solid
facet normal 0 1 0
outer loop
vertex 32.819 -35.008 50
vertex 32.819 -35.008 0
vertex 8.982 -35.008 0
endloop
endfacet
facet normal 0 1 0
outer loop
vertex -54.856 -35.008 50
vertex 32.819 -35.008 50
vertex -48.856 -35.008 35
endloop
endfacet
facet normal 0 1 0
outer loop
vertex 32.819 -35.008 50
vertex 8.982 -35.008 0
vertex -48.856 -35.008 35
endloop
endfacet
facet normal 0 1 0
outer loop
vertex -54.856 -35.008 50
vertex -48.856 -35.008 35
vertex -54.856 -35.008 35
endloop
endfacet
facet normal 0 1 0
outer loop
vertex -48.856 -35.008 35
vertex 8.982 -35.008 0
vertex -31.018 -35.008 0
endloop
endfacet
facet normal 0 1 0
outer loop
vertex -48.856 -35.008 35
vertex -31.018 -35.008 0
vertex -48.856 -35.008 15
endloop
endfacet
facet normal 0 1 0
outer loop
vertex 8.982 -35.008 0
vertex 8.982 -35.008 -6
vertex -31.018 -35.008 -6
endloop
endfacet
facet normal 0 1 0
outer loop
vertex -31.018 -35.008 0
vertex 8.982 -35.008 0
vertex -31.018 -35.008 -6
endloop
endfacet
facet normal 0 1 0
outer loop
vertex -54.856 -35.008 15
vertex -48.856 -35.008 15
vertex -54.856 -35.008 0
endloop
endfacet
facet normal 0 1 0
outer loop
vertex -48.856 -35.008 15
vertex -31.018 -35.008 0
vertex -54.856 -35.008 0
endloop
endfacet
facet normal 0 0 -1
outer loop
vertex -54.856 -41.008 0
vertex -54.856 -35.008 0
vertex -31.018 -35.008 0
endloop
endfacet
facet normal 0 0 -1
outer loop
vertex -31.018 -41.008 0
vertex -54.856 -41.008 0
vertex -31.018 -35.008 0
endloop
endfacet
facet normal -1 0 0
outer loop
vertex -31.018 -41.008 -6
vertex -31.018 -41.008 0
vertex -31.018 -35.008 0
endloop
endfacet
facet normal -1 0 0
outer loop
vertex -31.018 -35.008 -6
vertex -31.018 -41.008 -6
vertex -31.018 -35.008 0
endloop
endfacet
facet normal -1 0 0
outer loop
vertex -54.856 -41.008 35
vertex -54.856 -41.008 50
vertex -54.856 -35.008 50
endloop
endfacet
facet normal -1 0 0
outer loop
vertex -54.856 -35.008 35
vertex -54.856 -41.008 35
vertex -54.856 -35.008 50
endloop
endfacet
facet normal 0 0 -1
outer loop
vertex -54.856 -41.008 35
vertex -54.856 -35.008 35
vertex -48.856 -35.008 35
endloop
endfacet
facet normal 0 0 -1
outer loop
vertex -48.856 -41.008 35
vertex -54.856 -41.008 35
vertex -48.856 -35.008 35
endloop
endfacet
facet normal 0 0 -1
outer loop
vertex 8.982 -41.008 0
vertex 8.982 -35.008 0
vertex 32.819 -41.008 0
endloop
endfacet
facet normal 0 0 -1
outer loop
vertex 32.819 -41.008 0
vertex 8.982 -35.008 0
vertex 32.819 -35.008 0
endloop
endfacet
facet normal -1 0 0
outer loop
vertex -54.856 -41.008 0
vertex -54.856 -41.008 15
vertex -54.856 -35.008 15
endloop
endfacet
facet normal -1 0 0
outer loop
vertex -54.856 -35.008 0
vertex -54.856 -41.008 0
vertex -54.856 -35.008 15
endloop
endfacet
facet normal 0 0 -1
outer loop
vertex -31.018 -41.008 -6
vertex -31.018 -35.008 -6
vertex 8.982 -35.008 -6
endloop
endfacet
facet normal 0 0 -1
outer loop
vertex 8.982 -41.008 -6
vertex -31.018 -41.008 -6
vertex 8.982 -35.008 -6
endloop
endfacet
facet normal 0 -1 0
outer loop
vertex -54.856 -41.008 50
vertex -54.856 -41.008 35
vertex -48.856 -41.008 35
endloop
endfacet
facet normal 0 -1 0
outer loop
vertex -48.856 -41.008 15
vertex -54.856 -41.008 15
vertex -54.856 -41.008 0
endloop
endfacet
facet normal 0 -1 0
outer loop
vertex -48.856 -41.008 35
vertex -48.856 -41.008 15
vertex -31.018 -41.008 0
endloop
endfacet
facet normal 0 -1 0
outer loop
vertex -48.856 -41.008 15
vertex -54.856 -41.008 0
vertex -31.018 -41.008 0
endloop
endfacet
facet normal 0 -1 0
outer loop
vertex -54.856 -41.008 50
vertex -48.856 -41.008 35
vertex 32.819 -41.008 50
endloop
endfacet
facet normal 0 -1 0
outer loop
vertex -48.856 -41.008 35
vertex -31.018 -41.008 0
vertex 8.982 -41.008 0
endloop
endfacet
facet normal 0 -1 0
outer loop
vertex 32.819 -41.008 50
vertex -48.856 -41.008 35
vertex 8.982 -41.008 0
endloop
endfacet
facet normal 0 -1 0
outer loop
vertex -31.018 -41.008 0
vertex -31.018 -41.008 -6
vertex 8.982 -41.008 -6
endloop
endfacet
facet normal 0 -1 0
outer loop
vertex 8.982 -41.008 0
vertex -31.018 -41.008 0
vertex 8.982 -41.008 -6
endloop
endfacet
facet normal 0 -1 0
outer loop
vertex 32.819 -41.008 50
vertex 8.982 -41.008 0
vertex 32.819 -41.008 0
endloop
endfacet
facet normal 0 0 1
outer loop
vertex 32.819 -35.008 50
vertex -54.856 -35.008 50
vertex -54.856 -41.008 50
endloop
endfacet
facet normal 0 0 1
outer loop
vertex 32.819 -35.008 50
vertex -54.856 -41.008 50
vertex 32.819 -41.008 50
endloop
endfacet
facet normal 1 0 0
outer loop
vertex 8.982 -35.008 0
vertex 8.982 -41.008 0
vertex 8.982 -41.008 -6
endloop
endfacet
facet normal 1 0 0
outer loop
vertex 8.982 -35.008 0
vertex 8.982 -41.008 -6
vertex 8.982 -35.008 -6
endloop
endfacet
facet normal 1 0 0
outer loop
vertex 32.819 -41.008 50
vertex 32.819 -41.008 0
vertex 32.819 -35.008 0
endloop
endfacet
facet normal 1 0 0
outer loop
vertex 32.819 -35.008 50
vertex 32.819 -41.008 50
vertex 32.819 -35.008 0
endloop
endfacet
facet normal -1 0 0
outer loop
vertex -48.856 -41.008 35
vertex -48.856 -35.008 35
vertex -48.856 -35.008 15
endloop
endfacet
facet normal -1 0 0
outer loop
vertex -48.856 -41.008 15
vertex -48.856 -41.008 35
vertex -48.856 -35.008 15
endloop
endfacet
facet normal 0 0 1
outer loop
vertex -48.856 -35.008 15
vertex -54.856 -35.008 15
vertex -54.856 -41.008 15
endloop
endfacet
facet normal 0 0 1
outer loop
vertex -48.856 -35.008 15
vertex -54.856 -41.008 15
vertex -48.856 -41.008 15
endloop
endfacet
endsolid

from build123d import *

# Parameters (mm, degrees)
SKETCH1_W           = 87.675190279
SKETCH1_H           = 6
BOSS_EXTRUDE1_DEPTH = 50
SKETCH1_3_W         = 40
SKETCH1_3_H         = 6
BOSS_EXTRUDE2_DEPTH = 6
SKETCH2_W           = 6
SKETCH2_H           = 20
CUT_EXTRUDE1_DEPTH  = 6


with BuildPart() as part:
    # Sketch1 → Boss-Extrude1 (new body)
    with BuildSketch(Plane.XY):
        with Locations((-11.018263017, -38.008278224)):
            Rectangle(SKETCH1_W, SKETCH1_H)
    extrude(amount=BOSS_EXTRUDE1_DEPTH)

    # Sketch1<3> → Boss-Extrude2 (add)
    with BuildSketch(Plane.XY):
        with Locations((-11.018263016, -38.008278224)):
            Rectangle(SKETCH1_3_W, SKETCH1_3_H)
    extrude(amount=-BOSS_EXTRUDE2_DEPTH)

    # Sketch2 → Cut-Extrude1 (cut)
    with BuildSketch(Plane(origin=(0, -35.008278224, 0), x_dir=(1, 0, 0), z_dir=(0, 1, 0))):
        with Locations((-51.855858156, -25)):
            Rectangle(SKETCH2_W, SKETCH2_H)
    extrude(amount=-CUT_EXTRUDE1_DEPTH, mode=Mode.SUBTRACT)


solid = part.part
